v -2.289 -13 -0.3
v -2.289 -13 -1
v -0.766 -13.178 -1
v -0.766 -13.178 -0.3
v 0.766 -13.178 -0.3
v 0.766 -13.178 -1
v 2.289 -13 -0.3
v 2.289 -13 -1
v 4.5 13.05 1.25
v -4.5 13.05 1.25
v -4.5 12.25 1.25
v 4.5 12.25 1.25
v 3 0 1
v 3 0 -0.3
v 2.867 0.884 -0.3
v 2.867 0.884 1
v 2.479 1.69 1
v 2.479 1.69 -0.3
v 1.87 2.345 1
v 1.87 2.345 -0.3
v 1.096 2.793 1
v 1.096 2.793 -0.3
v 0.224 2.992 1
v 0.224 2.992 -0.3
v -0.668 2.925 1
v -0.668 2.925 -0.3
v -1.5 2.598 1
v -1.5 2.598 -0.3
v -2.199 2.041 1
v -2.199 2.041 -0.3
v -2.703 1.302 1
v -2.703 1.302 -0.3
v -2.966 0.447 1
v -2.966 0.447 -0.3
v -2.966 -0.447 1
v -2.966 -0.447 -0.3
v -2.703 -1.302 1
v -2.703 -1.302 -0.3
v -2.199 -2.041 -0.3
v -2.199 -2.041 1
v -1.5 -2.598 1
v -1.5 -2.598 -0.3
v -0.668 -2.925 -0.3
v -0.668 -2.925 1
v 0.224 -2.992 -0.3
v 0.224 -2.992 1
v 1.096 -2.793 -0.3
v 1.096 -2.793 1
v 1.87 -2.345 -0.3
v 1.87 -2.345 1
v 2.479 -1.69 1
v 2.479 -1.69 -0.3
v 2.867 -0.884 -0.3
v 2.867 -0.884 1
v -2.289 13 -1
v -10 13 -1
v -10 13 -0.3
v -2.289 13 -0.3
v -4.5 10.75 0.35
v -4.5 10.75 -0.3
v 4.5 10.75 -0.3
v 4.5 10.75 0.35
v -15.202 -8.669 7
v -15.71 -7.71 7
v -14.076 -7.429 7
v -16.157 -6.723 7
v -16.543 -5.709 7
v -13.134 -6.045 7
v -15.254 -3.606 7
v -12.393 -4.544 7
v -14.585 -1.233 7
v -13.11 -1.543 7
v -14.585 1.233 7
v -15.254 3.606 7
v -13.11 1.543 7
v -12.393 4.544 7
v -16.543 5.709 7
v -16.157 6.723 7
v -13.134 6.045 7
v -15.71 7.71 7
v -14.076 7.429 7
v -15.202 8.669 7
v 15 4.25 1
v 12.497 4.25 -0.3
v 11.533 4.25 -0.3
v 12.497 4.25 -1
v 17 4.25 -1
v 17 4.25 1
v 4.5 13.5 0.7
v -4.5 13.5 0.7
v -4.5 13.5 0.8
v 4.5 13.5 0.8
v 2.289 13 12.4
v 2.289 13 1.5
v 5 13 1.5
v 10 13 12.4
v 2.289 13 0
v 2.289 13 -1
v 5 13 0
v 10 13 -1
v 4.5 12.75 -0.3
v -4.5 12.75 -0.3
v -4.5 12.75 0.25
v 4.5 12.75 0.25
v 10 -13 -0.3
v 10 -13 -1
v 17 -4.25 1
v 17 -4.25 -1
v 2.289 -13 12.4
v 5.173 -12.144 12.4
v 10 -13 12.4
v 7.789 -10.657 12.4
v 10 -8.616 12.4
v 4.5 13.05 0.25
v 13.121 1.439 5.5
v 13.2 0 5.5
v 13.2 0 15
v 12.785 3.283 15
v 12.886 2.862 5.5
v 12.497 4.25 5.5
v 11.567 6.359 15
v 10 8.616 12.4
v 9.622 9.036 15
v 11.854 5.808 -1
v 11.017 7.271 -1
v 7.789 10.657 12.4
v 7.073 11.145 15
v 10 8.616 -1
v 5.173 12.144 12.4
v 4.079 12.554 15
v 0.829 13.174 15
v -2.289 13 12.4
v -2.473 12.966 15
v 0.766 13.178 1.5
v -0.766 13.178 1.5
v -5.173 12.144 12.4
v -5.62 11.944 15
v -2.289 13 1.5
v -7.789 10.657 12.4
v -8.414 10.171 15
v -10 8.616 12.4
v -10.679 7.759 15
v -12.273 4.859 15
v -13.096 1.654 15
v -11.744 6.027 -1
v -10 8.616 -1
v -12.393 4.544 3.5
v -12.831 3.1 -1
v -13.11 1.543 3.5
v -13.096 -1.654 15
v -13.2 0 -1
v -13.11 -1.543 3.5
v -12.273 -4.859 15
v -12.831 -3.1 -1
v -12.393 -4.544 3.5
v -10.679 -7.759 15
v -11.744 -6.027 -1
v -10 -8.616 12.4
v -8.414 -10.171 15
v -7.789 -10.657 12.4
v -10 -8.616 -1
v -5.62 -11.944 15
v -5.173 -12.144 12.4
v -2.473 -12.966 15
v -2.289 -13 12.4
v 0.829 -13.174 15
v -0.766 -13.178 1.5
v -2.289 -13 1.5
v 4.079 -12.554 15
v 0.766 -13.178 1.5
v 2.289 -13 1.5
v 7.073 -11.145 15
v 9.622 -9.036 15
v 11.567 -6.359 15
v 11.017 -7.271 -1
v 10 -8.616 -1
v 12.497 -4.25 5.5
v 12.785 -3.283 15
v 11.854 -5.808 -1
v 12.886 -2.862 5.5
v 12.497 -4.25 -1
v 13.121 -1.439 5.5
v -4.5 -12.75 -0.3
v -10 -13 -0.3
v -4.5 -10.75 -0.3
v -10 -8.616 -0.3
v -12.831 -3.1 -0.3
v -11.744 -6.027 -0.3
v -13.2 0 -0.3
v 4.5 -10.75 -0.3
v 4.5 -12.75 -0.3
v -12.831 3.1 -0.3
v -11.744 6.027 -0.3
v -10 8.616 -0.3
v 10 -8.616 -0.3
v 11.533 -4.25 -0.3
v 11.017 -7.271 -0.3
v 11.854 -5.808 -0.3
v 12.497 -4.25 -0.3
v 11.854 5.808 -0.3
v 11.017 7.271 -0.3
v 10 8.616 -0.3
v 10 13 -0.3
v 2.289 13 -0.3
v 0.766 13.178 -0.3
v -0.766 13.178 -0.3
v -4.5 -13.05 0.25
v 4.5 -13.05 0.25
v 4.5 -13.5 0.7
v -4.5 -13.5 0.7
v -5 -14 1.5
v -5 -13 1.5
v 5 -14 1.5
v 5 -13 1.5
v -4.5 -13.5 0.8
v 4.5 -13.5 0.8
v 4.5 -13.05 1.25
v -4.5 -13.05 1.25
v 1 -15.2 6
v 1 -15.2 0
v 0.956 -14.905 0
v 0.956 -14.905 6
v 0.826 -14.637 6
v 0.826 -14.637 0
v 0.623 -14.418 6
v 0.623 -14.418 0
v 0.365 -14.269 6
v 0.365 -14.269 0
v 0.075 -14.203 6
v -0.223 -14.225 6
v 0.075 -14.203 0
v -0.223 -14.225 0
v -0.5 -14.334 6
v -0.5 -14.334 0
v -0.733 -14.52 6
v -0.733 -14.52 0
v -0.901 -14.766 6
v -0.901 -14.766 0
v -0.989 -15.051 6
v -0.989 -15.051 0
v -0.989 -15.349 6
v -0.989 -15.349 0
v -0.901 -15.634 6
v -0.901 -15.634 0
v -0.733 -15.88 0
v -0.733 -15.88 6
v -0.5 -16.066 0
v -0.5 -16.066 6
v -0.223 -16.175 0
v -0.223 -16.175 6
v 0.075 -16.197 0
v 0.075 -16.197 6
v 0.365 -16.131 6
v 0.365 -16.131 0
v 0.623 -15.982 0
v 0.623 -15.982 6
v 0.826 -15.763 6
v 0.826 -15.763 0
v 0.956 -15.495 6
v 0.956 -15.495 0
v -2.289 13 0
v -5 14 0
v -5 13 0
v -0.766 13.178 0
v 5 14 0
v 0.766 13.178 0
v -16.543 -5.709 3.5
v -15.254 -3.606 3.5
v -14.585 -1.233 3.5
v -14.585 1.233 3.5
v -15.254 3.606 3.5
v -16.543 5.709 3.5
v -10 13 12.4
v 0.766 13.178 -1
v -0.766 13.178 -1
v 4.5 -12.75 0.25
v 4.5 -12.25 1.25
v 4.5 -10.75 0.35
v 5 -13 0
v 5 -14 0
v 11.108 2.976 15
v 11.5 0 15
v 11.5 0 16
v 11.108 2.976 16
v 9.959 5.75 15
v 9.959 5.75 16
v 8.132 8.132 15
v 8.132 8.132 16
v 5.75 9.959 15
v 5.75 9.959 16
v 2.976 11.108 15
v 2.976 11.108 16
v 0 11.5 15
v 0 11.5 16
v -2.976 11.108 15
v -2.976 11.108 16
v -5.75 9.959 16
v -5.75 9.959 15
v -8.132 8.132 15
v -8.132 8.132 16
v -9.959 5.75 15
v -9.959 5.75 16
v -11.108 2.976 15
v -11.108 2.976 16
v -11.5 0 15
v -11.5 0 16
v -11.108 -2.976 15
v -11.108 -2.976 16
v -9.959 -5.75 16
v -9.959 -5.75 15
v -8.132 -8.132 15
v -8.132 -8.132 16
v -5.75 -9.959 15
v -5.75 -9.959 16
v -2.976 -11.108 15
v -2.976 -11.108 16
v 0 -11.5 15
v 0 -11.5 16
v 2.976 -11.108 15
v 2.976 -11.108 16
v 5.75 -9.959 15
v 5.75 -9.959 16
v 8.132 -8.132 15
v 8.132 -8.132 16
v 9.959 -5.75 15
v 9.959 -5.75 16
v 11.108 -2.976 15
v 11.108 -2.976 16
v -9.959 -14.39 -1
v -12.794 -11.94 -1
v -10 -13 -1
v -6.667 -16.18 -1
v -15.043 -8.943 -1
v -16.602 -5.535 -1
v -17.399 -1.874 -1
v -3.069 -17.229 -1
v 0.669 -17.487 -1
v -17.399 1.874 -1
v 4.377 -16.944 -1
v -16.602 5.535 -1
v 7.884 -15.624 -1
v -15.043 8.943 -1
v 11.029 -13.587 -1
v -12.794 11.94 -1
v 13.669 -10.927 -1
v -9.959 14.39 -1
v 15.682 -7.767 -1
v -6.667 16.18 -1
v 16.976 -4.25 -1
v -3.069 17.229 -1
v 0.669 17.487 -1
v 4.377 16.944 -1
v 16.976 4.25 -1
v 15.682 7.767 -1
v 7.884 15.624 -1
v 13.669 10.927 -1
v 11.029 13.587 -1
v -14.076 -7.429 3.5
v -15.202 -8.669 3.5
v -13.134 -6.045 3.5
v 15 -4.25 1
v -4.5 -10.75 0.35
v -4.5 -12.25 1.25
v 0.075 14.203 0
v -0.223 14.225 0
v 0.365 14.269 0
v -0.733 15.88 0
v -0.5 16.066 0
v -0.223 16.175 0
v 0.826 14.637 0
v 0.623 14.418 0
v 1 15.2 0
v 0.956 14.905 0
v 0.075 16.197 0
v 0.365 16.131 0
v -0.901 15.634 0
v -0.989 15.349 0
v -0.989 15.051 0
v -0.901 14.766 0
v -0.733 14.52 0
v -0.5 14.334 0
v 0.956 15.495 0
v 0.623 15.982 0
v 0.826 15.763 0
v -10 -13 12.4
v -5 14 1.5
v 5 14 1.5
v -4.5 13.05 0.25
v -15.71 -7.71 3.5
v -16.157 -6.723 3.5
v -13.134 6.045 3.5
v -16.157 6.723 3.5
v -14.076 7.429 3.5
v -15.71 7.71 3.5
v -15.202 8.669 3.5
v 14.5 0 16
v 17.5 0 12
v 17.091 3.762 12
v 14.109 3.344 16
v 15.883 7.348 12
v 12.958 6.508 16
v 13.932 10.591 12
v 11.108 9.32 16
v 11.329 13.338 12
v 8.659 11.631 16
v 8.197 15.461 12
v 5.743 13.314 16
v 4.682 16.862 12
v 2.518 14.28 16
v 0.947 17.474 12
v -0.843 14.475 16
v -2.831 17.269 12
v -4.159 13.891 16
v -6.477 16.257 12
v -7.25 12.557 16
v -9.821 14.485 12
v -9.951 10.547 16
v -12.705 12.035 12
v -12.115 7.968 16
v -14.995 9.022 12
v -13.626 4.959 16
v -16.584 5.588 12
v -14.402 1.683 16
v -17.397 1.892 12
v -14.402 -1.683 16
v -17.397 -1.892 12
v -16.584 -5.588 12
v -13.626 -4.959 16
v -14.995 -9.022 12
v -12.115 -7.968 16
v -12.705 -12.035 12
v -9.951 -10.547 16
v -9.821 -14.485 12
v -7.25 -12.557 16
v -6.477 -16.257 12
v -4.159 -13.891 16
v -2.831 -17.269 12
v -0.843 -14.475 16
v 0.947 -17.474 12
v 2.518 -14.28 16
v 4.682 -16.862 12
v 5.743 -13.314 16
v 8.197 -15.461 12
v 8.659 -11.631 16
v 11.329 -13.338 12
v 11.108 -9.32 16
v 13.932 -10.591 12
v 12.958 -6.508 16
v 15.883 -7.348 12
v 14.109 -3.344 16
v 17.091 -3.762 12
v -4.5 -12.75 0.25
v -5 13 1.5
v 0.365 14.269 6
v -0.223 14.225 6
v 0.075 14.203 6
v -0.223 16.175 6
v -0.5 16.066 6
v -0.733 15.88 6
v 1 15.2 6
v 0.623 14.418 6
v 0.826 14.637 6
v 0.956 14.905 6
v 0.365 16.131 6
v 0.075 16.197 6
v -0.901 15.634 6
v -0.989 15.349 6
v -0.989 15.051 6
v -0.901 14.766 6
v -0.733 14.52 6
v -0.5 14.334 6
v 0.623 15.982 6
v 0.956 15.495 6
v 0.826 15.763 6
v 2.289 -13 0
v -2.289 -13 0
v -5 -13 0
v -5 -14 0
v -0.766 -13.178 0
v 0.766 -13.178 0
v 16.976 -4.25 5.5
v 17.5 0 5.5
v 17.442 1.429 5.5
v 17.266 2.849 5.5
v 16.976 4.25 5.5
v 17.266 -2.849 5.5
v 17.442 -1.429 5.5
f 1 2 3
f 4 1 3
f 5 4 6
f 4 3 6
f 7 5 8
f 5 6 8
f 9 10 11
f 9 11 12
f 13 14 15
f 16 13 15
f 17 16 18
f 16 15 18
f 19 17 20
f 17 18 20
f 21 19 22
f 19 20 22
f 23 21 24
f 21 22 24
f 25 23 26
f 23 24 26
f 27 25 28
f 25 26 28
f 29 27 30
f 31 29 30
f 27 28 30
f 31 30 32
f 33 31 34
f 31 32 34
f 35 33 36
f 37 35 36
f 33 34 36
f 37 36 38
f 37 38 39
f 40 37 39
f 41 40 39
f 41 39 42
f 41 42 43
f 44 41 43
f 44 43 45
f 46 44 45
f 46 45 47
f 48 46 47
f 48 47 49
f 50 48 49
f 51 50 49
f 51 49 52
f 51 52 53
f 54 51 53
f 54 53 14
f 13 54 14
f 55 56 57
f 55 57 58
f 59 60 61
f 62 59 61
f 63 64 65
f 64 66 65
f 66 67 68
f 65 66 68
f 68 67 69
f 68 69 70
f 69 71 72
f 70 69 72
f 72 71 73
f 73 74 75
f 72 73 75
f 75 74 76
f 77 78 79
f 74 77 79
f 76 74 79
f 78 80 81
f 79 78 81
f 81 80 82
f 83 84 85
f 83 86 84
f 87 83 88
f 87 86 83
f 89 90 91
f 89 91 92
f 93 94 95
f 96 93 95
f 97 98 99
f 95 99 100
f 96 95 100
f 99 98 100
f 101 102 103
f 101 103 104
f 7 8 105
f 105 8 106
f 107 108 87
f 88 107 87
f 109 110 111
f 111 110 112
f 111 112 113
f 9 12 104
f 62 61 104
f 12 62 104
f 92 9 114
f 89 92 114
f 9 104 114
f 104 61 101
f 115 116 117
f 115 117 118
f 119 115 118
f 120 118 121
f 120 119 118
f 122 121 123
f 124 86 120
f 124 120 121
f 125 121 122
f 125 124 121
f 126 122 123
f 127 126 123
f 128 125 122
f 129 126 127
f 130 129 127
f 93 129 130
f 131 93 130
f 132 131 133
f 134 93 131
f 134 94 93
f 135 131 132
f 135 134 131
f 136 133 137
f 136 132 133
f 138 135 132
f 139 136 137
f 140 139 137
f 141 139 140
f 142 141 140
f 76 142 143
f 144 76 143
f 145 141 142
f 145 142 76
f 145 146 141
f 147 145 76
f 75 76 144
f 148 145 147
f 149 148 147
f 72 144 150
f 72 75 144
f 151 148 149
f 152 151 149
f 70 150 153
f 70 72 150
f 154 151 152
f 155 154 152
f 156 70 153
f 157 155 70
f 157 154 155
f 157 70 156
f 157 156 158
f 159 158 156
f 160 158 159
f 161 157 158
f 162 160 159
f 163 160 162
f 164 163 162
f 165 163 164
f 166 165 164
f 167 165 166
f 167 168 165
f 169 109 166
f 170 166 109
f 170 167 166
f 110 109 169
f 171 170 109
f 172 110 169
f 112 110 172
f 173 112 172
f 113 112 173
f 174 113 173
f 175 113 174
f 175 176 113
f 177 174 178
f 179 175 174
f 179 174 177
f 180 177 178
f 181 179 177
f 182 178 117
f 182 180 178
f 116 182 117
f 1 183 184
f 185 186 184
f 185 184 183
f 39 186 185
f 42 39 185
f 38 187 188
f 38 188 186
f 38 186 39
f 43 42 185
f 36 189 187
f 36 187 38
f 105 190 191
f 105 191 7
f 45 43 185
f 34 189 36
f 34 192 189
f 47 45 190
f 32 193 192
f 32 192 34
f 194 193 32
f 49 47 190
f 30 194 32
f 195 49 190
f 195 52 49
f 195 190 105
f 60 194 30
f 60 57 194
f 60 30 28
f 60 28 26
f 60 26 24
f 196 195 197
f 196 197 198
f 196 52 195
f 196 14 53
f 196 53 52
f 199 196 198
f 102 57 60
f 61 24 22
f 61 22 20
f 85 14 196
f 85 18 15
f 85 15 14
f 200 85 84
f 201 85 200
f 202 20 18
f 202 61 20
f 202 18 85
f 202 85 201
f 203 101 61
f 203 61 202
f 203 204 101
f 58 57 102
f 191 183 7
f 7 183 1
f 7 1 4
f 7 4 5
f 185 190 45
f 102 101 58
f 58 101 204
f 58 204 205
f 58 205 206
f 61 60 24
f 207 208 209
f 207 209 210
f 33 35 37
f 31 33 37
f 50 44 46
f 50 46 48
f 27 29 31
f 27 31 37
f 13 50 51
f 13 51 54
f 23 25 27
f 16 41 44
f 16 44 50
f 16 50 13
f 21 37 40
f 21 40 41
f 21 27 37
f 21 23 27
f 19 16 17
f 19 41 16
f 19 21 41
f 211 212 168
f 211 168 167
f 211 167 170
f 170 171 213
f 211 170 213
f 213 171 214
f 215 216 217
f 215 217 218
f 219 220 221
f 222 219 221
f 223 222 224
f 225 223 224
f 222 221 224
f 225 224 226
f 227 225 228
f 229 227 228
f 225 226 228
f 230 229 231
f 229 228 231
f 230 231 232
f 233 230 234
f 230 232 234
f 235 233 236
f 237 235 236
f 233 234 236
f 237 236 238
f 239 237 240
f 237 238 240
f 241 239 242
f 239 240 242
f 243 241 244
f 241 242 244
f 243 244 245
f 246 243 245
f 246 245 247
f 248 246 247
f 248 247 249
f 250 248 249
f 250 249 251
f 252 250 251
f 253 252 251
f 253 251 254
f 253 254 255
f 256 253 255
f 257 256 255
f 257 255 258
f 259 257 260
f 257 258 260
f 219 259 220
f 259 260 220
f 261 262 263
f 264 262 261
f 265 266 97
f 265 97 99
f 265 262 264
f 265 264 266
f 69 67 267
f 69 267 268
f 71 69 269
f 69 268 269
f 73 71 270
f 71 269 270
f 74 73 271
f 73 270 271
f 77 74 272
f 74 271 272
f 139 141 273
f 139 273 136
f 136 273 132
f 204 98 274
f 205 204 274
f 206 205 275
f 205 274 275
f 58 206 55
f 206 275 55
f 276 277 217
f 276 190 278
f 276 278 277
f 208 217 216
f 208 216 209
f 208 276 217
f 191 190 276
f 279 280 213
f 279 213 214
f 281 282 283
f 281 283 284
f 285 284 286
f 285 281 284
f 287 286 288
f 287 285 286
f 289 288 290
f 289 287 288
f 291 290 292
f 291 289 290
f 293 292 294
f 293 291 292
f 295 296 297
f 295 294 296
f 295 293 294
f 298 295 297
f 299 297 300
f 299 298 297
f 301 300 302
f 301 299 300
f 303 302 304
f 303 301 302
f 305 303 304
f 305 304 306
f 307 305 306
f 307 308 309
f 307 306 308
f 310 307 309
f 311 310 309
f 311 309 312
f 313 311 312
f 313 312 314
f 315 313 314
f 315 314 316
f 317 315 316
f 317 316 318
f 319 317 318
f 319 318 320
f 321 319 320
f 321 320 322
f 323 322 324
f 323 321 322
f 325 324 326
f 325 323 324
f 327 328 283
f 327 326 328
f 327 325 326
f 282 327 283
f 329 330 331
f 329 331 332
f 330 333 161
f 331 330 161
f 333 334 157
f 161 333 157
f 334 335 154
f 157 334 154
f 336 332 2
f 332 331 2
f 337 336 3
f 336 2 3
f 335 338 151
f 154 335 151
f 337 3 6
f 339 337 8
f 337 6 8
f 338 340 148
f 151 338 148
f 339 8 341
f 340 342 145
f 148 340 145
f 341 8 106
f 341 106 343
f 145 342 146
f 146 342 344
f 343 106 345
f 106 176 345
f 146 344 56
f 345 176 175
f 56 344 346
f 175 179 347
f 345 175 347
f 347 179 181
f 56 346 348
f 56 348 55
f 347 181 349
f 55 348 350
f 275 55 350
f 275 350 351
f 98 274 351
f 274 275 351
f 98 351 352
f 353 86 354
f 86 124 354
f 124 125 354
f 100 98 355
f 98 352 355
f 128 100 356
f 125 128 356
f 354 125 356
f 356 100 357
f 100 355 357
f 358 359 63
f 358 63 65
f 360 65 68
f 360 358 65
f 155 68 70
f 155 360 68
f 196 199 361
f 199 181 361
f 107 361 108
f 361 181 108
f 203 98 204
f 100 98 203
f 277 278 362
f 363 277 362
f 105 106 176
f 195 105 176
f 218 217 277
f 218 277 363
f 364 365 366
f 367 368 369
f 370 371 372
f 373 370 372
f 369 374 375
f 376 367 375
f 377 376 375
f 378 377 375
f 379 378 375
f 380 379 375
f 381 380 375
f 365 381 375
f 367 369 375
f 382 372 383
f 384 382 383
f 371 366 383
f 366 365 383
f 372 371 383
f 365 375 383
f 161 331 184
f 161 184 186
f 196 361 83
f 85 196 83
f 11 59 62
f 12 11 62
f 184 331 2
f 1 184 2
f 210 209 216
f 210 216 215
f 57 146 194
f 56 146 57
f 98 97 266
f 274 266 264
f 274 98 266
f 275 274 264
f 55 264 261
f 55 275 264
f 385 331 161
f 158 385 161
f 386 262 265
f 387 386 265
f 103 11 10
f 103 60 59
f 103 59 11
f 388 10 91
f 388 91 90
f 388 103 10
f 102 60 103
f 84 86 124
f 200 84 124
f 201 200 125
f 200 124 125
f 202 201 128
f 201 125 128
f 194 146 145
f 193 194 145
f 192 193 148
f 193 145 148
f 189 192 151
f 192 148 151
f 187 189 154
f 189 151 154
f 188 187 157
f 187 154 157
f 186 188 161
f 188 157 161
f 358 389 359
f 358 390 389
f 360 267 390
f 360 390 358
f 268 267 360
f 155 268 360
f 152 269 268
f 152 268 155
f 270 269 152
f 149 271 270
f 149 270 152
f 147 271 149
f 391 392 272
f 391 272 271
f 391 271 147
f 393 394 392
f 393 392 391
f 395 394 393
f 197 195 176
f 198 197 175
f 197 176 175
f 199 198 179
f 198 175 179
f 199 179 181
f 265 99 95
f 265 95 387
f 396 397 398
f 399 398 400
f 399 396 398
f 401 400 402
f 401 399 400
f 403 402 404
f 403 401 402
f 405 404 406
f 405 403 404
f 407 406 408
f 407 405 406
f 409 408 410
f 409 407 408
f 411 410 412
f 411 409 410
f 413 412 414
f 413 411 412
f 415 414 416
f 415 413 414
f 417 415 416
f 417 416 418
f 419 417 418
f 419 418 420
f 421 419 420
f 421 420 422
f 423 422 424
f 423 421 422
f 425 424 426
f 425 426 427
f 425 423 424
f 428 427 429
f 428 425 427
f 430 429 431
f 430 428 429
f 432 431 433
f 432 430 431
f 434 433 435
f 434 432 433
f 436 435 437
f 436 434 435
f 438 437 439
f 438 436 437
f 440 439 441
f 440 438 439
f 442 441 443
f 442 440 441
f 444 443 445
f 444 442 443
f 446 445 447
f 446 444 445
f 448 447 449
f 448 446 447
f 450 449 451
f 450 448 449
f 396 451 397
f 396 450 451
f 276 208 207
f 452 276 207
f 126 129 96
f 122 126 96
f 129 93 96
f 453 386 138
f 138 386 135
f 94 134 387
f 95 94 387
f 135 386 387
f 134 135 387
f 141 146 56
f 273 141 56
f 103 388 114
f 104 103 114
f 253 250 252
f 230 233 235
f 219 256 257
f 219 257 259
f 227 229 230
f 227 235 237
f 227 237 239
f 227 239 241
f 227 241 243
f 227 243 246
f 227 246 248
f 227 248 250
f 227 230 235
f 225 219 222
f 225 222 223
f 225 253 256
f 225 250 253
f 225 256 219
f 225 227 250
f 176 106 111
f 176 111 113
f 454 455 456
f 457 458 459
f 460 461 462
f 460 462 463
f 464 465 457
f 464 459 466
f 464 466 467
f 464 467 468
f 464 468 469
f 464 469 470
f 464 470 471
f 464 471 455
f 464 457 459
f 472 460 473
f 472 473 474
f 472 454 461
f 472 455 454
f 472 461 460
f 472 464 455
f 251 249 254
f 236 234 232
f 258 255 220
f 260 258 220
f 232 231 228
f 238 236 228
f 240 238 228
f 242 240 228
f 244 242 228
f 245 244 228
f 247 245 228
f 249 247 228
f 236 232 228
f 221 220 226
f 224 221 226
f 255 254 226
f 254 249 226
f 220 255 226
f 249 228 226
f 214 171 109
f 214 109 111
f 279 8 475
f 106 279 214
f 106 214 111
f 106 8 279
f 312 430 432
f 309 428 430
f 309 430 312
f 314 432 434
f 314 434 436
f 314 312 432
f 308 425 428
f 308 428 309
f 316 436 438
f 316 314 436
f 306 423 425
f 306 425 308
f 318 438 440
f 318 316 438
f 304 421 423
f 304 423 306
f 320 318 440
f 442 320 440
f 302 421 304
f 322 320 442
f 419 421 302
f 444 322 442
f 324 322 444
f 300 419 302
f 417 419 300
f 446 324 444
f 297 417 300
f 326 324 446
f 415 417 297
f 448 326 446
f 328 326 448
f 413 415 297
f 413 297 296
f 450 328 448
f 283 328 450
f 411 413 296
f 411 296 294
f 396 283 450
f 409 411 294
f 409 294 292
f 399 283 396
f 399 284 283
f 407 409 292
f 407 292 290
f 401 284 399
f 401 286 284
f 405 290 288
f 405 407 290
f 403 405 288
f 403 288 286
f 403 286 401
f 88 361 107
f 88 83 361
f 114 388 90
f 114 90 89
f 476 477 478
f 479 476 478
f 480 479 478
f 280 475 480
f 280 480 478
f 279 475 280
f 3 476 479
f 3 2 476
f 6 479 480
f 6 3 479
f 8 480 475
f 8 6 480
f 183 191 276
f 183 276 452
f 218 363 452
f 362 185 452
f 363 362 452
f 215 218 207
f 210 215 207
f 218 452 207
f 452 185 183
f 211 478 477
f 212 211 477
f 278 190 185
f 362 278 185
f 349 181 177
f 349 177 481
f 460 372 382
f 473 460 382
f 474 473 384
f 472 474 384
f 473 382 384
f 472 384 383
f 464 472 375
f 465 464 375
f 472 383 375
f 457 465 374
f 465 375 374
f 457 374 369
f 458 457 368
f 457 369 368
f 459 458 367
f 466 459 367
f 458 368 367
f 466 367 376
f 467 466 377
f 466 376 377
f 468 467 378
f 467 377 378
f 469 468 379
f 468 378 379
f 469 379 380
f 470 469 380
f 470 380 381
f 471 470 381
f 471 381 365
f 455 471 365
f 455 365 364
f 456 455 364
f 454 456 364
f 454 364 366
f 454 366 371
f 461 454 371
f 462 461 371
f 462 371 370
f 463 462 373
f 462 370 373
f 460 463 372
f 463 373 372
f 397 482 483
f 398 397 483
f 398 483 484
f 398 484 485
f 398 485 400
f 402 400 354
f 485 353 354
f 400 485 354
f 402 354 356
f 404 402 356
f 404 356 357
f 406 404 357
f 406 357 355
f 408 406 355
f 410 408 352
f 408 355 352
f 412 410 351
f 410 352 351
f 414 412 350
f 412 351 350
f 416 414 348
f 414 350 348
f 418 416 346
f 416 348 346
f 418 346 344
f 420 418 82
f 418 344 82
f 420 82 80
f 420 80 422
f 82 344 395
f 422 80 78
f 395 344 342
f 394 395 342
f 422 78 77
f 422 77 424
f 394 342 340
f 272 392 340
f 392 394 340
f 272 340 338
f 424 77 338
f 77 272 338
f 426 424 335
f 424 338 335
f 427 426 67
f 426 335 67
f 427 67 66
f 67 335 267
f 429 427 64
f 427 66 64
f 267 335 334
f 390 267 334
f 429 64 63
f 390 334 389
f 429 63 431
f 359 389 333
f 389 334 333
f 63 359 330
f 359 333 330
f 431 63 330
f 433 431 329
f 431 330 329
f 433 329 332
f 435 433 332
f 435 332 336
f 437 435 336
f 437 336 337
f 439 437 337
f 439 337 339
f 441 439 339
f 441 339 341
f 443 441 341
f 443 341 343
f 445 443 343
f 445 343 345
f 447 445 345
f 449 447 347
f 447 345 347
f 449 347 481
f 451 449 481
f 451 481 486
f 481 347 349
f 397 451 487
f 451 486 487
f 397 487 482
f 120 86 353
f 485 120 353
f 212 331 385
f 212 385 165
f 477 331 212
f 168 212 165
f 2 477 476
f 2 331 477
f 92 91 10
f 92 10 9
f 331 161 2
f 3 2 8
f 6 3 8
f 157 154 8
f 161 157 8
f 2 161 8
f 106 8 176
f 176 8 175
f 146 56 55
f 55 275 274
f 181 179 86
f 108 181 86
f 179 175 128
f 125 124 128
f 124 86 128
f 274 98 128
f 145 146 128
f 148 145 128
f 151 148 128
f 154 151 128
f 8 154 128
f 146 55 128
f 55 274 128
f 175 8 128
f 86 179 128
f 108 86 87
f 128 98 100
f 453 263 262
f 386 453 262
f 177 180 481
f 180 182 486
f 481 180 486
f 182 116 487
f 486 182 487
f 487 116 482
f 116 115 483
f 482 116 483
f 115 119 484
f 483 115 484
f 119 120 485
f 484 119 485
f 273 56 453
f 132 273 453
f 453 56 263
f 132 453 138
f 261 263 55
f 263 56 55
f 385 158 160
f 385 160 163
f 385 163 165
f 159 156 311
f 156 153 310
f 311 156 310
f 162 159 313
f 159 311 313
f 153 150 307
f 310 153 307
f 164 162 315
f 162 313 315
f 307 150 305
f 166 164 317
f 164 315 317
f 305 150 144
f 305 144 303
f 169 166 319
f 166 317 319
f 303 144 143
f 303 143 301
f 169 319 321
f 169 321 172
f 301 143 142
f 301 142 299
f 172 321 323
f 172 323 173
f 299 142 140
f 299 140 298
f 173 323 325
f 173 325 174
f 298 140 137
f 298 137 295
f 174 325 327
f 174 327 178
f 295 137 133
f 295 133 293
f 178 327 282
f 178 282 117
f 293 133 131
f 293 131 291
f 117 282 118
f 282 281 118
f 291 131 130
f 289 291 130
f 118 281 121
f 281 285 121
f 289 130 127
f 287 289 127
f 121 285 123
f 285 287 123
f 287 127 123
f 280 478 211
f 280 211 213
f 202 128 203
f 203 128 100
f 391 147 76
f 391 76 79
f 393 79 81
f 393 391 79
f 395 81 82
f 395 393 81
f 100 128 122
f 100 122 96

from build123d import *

# Parameters (mm, degrees)
CYLINDER007_R              = 1
CYLINDER007_DEPTH          = 6
CYLINDER008_R              = 1
CYLINDER008_DEPTH          = 6
CYLINDER002_R              = 11.5
CYLINDER002_DEPTH          = 30
BOX_W                      = 20
BOX_H                      = 26
BOX_DEPTH                  = 13.4
BOX001_W                   = 16
BOX001_H                   = 8.5
BOX001_DEPTH               = 7
CYLINDER018_R              = 9
CYLINDER018_DEPTH          = 3.5
CYLINDER017_R              = 12
CYLINDER017_DEPTH          = 3.5
BOX006_W                   = 10
BOX006_H                   = 2
BOX006_DEPTH               = 1.5
BOX007_W                   = 10
BOX007_H                   = 2
BOX007_DEPTH               = 1.5
CYLINDER_R                 = 13.2
CYLINDER_DEPTH             = 16
CYLINDER006_R              = 17.5
CYLINDER006_DEPTH          = 17
CHAMFER_SIZE2              = 3
CHAMFER_SIZE               = 4
BOX002_W                   = 20
BOX002_H                   = 26
BOX002_DEPTH               = 0.7
CYLINDER016_R              = 3
CYLINDER016_DEPTH          = 1.5
BOX003_W                   = 6
BOX003_H                   = 8.5
BOX003_DEPTH               = 2
CHAMFER004_SIZE2           = 4
CHAMFER004_SIZE            = 1.5
BOX008_W                   = 9
BOX008_H                   = 2
BOX008_DEPTH               = 1
BOX004_W                   = 9
BOX004_H                   = 2.75
BOX004_DEPTH               = 1
CHAMFER005_SIZE2           = 0.9
CHAMFER005_SIZE            = 1.5
CHAMFER006_SIZE            = 0.45
CHAMFER006_PLACEMENT_ANGLE = 180
CHAMFER007_SIZE            = 0.45
CYLINDER019_R              = 13.2
CYLINDER019_DEPTH          = 0.7


with BuildPart() as r_screw:
    # Cylinder007 → Cylinder007 (new body)
    with BuildSketch(Plane(origin=(0, -15.2, 0), x_dir=(1, 0, 0), z_dir=(0, 0, 1))):
        Circle(CYLINDER007_R)
    extrude(amount=CYLINDER007_DEPTH)


with BuildPart() as l_screw:
    # Cylinder008 → Cylinder008 (new body)
    with BuildSketch(Plane(origin=(0, 15.2, 0), x_dir=(1, 0, 0), z_dir=(0, 0, 1))):
        Circle(CYLINDER008_R)
    extrude(amount=CYLINDER008_DEPTH)


with BuildPart() as diffuserhole:
    # Cylinder002 → Cylinder002 (new body)
    with BuildSketch(Plane.XY):
        Circle(CYLINDER002_R)
    extrude(amount=CYLINDER002_DEPTH)


with BuildPart() as batteryhole:
    # Box → Box (new body)
    with BuildSketch(Plane(origin=(-10, -13, -1), x_dir=(1, 0, 0), z_dir=(0, 0, 1))):
        with Locations((10, 13)):
            Rectangle(BOX_W, BOX_H)
    extrude(amount=BOX_DEPTH)


with BuildPart() as usb:
    # Box001 → Box001 (new body)
    with BuildSketch(Plane(origin=(7, -4.25, -1.5), x_dir=(1, 0, 0), z_dir=(0, 0, 1))):
        with Locations((8, 4.25)):
            Rectangle(BOX001_W, BOX001_H)
    extrude(amount=BOX001_DEPTH)


with BuildPart() as cylinder001:
    # Cylinder018 → Cylinder018 (new body)
    with BuildSketch(Plane(origin=(-23.5, 0, 3.5), x_dir=(1, 0, 0), z_dir=(0, 0, 1))):
        Circle(CYLINDER018_R)
    extrude(amount=CYLINDER018_DEPTH)


with BuildPart() as chain_channel:
    # Cylinder017 → Cylinder017 (new body)
    with BuildSketch(Plane(origin=(-23.5, 0, 3.5), x_dir=(1, 0, 0), z_dir=(0, 0, 1))):
        Circle(CYLINDER017_R)
    extrude(amount=CYLINDER017_DEPTH)

    # Cut002: cut Cylinder001
    add(cylinder001.part, mode=Mode.SUBTRACT)


with BuildPart() as tab_2_female:
    # Box006 → Box006 (new body)
    with BuildSketch(Plane(origin=(-5, -14, 0), x_dir=(1, 0, 0), z_dir=(0, 0, 1))):
        with Locations((5, 1)):
            Rectangle(BOX006_W, BOX006_H)
    extrude(amount=BOX006_DEPTH)


with BuildPart() as tab_1_female:
    # Box007 → Box007 (new body)
    with BuildSketch(Plane(origin=(-5, 12, 0), x_dir=(1, 0, 0), z_dir=(0, 0, 1))):
        with Locations((5, 1)):
            Rectangle(BOX007_W, BOX007_H)
    extrude(amount=BOX007_DEPTH)


with BuildPart() as guts:
    # Cylinder → Cylinder (new body)
    with BuildSketch(Plane.XY.offset(-1)):
        Circle(CYLINDER_R)
    extrude(amount=CYLINDER_DEPTH)

    # Fusion: union DiffuserHole, BatteryHole, USB, Chain Channel, Tab 2 Female, Tab 1 Female
    add(diffuserhole.part)
    add(batteryhole.part)
    add(usb.part)
    add(chain_channel.part)
    add(tab_2_female.part)
    add(tab_1_female.part)


with BuildPart() as front:
    # Cylinder006 → Cylinder006 (new body)
    with BuildSketch(Plane.XY.offset(-1)):
        Circle(CYLINDER006_R)
    extrude(amount=CYLINDER006_DEPTH)

    # Chamfer
    chamfer_edges = [front.edges().sort_by_distance(p)[0] for p in [
        (-17.5, 0, 16),
    ]]
    chamfer_side = front.faces().sort_by_distance((-17.5, 0, 7.5))[0]
    chamfer(chamfer_edges, length=CHAMFER_SIZE, length2=CHAMFER_SIZE2, reference=chamfer_side)

    # Cut: cut Guts
    add(guts.part, mode=Mode.SUBTRACT)


with BuildPart() as batteryhole001:
    # Box002 → Box002 (new body)
    with BuildSketch(Plane(origin=(-10, -13, -1), x_dir=(1, 0, 0), z_dir=(0, 0, 1))):
        with Locations((10, 13)):
            Rectangle(BOX002_W, BOX002_H)
    extrude(amount=BOX002_DEPTH)


with BuildPart() as button_presser:
    # Cylinder016 → Cylinder016 (new body)
    with BuildSketch(Plane.XY.offset(-0.5)):
        Circle(CYLINDER016_R)
    extrude(amount=CYLINDER016_DEPTH)


with BuildPart() as usb_cover:
    # Box003 → Box003 (new body)
    with BuildSketch(Plane(origin=(11, -4.25, -1), x_dir=(1, 0, 0), z_dir=(0, 0, 1))):
        with Locations((3, 4.25)):
            Rectangle(BOX003_W, BOX003_H)
    extrude(amount=BOX003_DEPTH)

    # Chamfer004
    chamfer004_edges = [usb_cover.edges().sort_by_distance(p)[0] for p in [
        (11, 0, 1),
    ]]
    chamfer004_side = usb_cover.faces().sort_by_distance((11, 0, 0))[0]
    chamfer(chamfer004_edges, length=CHAMFER004_SIZE, length2=CHAMFER004_SIZE2, reference=chamfer004_side)


with BuildPart() as tab_base:
    # Box008 → Box008 (new body)
    with BuildSketch(Plane(origin=(-4.5, 10.75, -0.75), x_dir=(1, 0, 0), z_dir=(0, 0, 1))):
        with Locations((4.5, 1)):
            Rectangle(BOX008_W, BOX008_H)
    extrude(amount=BOX008_DEPTH)


with BuildPart() as chamfer005:
    # Box004 → Box004 (new body)
    with BuildSketch(Plane(origin=(-4.5, 10.75, 0.25), x_dir=(1, 0, 0), z_dir=(0, 0, 1))):
        with Locations((4.5, 1.375)):
            Rectangle(BOX004_W, BOX004_H)
    extrude(amount=BOX004_DEPTH)

    # Fusion002: union Tab Base
    add(tab_base.part)

    # Chamfer005
    chamfer005_edges = [chamfer005.edges().sort_by_distance(p)[0] for p in [
        (0, 10.75, 1.25),
    ]]
    chamfer005_side = chamfer005.faces().sort_by_distance((0, 12.125, 1.25))[0]
    chamfer(chamfer005_edges, length=CHAMFER005_SIZE, length2=CHAMFER005_SIZE2, reference=chamfer005_side)


with BuildPart() as chamfer006:
    # Chamfer006 base: copy of Chamfer005
    add(chamfer005.part)

    # Chamfer006
    chamfer006_edges = [chamfer006.edges().sort_by_distance(p)[0] for p in [
        (0, 13.5, 1.25),
        (0, 13.5, 0.25),
    ]]
    chamfer(chamfer006_edges, length=CHAMFER006_SIZE)


with BuildPart() as chamfer006_1:
    # Chamfer006 placement: moved
    add(chamfer006.part.rotate(Axis((0, 0, 0), (0, 0, 1)), CHAMFER006_PLACEMENT_ANGLE))


with BuildPart() as chamfer007:
    # Chamfer007 base: copy of Chamfer005
    add(chamfer005.part)

    # Chamfer007
    chamfer007_edges = [chamfer007.edges().sort_by_distance(p)[0] for p in [
        (0, 13.5, 1.25),
        (0, 13.5, 0.25),
    ]]
    chamfer(chamfer007_edges, length=CHAMFER007_SIZE)


with BuildPart() as back:
    # Cylinder019 → Cylinder019 (new body)
    with BuildSketch(Plane.XY.offset(-1)):
        Circle(CYLINDER019_R)
    extrude(amount=CYLINDER019_DEPTH)

    # Fusion001: union BatteryHole001, Button Presser, USB Cover, Chamfer006, Chamfer007
    add(batteryhole001.part)
    add(button_presser.part)
    add(usb_cover.part)
    add(chamfer006_1.part)
    add(chamfer007.part)


solid = Compound([r_screw.part, l_screw.part, front.part, back.part])
